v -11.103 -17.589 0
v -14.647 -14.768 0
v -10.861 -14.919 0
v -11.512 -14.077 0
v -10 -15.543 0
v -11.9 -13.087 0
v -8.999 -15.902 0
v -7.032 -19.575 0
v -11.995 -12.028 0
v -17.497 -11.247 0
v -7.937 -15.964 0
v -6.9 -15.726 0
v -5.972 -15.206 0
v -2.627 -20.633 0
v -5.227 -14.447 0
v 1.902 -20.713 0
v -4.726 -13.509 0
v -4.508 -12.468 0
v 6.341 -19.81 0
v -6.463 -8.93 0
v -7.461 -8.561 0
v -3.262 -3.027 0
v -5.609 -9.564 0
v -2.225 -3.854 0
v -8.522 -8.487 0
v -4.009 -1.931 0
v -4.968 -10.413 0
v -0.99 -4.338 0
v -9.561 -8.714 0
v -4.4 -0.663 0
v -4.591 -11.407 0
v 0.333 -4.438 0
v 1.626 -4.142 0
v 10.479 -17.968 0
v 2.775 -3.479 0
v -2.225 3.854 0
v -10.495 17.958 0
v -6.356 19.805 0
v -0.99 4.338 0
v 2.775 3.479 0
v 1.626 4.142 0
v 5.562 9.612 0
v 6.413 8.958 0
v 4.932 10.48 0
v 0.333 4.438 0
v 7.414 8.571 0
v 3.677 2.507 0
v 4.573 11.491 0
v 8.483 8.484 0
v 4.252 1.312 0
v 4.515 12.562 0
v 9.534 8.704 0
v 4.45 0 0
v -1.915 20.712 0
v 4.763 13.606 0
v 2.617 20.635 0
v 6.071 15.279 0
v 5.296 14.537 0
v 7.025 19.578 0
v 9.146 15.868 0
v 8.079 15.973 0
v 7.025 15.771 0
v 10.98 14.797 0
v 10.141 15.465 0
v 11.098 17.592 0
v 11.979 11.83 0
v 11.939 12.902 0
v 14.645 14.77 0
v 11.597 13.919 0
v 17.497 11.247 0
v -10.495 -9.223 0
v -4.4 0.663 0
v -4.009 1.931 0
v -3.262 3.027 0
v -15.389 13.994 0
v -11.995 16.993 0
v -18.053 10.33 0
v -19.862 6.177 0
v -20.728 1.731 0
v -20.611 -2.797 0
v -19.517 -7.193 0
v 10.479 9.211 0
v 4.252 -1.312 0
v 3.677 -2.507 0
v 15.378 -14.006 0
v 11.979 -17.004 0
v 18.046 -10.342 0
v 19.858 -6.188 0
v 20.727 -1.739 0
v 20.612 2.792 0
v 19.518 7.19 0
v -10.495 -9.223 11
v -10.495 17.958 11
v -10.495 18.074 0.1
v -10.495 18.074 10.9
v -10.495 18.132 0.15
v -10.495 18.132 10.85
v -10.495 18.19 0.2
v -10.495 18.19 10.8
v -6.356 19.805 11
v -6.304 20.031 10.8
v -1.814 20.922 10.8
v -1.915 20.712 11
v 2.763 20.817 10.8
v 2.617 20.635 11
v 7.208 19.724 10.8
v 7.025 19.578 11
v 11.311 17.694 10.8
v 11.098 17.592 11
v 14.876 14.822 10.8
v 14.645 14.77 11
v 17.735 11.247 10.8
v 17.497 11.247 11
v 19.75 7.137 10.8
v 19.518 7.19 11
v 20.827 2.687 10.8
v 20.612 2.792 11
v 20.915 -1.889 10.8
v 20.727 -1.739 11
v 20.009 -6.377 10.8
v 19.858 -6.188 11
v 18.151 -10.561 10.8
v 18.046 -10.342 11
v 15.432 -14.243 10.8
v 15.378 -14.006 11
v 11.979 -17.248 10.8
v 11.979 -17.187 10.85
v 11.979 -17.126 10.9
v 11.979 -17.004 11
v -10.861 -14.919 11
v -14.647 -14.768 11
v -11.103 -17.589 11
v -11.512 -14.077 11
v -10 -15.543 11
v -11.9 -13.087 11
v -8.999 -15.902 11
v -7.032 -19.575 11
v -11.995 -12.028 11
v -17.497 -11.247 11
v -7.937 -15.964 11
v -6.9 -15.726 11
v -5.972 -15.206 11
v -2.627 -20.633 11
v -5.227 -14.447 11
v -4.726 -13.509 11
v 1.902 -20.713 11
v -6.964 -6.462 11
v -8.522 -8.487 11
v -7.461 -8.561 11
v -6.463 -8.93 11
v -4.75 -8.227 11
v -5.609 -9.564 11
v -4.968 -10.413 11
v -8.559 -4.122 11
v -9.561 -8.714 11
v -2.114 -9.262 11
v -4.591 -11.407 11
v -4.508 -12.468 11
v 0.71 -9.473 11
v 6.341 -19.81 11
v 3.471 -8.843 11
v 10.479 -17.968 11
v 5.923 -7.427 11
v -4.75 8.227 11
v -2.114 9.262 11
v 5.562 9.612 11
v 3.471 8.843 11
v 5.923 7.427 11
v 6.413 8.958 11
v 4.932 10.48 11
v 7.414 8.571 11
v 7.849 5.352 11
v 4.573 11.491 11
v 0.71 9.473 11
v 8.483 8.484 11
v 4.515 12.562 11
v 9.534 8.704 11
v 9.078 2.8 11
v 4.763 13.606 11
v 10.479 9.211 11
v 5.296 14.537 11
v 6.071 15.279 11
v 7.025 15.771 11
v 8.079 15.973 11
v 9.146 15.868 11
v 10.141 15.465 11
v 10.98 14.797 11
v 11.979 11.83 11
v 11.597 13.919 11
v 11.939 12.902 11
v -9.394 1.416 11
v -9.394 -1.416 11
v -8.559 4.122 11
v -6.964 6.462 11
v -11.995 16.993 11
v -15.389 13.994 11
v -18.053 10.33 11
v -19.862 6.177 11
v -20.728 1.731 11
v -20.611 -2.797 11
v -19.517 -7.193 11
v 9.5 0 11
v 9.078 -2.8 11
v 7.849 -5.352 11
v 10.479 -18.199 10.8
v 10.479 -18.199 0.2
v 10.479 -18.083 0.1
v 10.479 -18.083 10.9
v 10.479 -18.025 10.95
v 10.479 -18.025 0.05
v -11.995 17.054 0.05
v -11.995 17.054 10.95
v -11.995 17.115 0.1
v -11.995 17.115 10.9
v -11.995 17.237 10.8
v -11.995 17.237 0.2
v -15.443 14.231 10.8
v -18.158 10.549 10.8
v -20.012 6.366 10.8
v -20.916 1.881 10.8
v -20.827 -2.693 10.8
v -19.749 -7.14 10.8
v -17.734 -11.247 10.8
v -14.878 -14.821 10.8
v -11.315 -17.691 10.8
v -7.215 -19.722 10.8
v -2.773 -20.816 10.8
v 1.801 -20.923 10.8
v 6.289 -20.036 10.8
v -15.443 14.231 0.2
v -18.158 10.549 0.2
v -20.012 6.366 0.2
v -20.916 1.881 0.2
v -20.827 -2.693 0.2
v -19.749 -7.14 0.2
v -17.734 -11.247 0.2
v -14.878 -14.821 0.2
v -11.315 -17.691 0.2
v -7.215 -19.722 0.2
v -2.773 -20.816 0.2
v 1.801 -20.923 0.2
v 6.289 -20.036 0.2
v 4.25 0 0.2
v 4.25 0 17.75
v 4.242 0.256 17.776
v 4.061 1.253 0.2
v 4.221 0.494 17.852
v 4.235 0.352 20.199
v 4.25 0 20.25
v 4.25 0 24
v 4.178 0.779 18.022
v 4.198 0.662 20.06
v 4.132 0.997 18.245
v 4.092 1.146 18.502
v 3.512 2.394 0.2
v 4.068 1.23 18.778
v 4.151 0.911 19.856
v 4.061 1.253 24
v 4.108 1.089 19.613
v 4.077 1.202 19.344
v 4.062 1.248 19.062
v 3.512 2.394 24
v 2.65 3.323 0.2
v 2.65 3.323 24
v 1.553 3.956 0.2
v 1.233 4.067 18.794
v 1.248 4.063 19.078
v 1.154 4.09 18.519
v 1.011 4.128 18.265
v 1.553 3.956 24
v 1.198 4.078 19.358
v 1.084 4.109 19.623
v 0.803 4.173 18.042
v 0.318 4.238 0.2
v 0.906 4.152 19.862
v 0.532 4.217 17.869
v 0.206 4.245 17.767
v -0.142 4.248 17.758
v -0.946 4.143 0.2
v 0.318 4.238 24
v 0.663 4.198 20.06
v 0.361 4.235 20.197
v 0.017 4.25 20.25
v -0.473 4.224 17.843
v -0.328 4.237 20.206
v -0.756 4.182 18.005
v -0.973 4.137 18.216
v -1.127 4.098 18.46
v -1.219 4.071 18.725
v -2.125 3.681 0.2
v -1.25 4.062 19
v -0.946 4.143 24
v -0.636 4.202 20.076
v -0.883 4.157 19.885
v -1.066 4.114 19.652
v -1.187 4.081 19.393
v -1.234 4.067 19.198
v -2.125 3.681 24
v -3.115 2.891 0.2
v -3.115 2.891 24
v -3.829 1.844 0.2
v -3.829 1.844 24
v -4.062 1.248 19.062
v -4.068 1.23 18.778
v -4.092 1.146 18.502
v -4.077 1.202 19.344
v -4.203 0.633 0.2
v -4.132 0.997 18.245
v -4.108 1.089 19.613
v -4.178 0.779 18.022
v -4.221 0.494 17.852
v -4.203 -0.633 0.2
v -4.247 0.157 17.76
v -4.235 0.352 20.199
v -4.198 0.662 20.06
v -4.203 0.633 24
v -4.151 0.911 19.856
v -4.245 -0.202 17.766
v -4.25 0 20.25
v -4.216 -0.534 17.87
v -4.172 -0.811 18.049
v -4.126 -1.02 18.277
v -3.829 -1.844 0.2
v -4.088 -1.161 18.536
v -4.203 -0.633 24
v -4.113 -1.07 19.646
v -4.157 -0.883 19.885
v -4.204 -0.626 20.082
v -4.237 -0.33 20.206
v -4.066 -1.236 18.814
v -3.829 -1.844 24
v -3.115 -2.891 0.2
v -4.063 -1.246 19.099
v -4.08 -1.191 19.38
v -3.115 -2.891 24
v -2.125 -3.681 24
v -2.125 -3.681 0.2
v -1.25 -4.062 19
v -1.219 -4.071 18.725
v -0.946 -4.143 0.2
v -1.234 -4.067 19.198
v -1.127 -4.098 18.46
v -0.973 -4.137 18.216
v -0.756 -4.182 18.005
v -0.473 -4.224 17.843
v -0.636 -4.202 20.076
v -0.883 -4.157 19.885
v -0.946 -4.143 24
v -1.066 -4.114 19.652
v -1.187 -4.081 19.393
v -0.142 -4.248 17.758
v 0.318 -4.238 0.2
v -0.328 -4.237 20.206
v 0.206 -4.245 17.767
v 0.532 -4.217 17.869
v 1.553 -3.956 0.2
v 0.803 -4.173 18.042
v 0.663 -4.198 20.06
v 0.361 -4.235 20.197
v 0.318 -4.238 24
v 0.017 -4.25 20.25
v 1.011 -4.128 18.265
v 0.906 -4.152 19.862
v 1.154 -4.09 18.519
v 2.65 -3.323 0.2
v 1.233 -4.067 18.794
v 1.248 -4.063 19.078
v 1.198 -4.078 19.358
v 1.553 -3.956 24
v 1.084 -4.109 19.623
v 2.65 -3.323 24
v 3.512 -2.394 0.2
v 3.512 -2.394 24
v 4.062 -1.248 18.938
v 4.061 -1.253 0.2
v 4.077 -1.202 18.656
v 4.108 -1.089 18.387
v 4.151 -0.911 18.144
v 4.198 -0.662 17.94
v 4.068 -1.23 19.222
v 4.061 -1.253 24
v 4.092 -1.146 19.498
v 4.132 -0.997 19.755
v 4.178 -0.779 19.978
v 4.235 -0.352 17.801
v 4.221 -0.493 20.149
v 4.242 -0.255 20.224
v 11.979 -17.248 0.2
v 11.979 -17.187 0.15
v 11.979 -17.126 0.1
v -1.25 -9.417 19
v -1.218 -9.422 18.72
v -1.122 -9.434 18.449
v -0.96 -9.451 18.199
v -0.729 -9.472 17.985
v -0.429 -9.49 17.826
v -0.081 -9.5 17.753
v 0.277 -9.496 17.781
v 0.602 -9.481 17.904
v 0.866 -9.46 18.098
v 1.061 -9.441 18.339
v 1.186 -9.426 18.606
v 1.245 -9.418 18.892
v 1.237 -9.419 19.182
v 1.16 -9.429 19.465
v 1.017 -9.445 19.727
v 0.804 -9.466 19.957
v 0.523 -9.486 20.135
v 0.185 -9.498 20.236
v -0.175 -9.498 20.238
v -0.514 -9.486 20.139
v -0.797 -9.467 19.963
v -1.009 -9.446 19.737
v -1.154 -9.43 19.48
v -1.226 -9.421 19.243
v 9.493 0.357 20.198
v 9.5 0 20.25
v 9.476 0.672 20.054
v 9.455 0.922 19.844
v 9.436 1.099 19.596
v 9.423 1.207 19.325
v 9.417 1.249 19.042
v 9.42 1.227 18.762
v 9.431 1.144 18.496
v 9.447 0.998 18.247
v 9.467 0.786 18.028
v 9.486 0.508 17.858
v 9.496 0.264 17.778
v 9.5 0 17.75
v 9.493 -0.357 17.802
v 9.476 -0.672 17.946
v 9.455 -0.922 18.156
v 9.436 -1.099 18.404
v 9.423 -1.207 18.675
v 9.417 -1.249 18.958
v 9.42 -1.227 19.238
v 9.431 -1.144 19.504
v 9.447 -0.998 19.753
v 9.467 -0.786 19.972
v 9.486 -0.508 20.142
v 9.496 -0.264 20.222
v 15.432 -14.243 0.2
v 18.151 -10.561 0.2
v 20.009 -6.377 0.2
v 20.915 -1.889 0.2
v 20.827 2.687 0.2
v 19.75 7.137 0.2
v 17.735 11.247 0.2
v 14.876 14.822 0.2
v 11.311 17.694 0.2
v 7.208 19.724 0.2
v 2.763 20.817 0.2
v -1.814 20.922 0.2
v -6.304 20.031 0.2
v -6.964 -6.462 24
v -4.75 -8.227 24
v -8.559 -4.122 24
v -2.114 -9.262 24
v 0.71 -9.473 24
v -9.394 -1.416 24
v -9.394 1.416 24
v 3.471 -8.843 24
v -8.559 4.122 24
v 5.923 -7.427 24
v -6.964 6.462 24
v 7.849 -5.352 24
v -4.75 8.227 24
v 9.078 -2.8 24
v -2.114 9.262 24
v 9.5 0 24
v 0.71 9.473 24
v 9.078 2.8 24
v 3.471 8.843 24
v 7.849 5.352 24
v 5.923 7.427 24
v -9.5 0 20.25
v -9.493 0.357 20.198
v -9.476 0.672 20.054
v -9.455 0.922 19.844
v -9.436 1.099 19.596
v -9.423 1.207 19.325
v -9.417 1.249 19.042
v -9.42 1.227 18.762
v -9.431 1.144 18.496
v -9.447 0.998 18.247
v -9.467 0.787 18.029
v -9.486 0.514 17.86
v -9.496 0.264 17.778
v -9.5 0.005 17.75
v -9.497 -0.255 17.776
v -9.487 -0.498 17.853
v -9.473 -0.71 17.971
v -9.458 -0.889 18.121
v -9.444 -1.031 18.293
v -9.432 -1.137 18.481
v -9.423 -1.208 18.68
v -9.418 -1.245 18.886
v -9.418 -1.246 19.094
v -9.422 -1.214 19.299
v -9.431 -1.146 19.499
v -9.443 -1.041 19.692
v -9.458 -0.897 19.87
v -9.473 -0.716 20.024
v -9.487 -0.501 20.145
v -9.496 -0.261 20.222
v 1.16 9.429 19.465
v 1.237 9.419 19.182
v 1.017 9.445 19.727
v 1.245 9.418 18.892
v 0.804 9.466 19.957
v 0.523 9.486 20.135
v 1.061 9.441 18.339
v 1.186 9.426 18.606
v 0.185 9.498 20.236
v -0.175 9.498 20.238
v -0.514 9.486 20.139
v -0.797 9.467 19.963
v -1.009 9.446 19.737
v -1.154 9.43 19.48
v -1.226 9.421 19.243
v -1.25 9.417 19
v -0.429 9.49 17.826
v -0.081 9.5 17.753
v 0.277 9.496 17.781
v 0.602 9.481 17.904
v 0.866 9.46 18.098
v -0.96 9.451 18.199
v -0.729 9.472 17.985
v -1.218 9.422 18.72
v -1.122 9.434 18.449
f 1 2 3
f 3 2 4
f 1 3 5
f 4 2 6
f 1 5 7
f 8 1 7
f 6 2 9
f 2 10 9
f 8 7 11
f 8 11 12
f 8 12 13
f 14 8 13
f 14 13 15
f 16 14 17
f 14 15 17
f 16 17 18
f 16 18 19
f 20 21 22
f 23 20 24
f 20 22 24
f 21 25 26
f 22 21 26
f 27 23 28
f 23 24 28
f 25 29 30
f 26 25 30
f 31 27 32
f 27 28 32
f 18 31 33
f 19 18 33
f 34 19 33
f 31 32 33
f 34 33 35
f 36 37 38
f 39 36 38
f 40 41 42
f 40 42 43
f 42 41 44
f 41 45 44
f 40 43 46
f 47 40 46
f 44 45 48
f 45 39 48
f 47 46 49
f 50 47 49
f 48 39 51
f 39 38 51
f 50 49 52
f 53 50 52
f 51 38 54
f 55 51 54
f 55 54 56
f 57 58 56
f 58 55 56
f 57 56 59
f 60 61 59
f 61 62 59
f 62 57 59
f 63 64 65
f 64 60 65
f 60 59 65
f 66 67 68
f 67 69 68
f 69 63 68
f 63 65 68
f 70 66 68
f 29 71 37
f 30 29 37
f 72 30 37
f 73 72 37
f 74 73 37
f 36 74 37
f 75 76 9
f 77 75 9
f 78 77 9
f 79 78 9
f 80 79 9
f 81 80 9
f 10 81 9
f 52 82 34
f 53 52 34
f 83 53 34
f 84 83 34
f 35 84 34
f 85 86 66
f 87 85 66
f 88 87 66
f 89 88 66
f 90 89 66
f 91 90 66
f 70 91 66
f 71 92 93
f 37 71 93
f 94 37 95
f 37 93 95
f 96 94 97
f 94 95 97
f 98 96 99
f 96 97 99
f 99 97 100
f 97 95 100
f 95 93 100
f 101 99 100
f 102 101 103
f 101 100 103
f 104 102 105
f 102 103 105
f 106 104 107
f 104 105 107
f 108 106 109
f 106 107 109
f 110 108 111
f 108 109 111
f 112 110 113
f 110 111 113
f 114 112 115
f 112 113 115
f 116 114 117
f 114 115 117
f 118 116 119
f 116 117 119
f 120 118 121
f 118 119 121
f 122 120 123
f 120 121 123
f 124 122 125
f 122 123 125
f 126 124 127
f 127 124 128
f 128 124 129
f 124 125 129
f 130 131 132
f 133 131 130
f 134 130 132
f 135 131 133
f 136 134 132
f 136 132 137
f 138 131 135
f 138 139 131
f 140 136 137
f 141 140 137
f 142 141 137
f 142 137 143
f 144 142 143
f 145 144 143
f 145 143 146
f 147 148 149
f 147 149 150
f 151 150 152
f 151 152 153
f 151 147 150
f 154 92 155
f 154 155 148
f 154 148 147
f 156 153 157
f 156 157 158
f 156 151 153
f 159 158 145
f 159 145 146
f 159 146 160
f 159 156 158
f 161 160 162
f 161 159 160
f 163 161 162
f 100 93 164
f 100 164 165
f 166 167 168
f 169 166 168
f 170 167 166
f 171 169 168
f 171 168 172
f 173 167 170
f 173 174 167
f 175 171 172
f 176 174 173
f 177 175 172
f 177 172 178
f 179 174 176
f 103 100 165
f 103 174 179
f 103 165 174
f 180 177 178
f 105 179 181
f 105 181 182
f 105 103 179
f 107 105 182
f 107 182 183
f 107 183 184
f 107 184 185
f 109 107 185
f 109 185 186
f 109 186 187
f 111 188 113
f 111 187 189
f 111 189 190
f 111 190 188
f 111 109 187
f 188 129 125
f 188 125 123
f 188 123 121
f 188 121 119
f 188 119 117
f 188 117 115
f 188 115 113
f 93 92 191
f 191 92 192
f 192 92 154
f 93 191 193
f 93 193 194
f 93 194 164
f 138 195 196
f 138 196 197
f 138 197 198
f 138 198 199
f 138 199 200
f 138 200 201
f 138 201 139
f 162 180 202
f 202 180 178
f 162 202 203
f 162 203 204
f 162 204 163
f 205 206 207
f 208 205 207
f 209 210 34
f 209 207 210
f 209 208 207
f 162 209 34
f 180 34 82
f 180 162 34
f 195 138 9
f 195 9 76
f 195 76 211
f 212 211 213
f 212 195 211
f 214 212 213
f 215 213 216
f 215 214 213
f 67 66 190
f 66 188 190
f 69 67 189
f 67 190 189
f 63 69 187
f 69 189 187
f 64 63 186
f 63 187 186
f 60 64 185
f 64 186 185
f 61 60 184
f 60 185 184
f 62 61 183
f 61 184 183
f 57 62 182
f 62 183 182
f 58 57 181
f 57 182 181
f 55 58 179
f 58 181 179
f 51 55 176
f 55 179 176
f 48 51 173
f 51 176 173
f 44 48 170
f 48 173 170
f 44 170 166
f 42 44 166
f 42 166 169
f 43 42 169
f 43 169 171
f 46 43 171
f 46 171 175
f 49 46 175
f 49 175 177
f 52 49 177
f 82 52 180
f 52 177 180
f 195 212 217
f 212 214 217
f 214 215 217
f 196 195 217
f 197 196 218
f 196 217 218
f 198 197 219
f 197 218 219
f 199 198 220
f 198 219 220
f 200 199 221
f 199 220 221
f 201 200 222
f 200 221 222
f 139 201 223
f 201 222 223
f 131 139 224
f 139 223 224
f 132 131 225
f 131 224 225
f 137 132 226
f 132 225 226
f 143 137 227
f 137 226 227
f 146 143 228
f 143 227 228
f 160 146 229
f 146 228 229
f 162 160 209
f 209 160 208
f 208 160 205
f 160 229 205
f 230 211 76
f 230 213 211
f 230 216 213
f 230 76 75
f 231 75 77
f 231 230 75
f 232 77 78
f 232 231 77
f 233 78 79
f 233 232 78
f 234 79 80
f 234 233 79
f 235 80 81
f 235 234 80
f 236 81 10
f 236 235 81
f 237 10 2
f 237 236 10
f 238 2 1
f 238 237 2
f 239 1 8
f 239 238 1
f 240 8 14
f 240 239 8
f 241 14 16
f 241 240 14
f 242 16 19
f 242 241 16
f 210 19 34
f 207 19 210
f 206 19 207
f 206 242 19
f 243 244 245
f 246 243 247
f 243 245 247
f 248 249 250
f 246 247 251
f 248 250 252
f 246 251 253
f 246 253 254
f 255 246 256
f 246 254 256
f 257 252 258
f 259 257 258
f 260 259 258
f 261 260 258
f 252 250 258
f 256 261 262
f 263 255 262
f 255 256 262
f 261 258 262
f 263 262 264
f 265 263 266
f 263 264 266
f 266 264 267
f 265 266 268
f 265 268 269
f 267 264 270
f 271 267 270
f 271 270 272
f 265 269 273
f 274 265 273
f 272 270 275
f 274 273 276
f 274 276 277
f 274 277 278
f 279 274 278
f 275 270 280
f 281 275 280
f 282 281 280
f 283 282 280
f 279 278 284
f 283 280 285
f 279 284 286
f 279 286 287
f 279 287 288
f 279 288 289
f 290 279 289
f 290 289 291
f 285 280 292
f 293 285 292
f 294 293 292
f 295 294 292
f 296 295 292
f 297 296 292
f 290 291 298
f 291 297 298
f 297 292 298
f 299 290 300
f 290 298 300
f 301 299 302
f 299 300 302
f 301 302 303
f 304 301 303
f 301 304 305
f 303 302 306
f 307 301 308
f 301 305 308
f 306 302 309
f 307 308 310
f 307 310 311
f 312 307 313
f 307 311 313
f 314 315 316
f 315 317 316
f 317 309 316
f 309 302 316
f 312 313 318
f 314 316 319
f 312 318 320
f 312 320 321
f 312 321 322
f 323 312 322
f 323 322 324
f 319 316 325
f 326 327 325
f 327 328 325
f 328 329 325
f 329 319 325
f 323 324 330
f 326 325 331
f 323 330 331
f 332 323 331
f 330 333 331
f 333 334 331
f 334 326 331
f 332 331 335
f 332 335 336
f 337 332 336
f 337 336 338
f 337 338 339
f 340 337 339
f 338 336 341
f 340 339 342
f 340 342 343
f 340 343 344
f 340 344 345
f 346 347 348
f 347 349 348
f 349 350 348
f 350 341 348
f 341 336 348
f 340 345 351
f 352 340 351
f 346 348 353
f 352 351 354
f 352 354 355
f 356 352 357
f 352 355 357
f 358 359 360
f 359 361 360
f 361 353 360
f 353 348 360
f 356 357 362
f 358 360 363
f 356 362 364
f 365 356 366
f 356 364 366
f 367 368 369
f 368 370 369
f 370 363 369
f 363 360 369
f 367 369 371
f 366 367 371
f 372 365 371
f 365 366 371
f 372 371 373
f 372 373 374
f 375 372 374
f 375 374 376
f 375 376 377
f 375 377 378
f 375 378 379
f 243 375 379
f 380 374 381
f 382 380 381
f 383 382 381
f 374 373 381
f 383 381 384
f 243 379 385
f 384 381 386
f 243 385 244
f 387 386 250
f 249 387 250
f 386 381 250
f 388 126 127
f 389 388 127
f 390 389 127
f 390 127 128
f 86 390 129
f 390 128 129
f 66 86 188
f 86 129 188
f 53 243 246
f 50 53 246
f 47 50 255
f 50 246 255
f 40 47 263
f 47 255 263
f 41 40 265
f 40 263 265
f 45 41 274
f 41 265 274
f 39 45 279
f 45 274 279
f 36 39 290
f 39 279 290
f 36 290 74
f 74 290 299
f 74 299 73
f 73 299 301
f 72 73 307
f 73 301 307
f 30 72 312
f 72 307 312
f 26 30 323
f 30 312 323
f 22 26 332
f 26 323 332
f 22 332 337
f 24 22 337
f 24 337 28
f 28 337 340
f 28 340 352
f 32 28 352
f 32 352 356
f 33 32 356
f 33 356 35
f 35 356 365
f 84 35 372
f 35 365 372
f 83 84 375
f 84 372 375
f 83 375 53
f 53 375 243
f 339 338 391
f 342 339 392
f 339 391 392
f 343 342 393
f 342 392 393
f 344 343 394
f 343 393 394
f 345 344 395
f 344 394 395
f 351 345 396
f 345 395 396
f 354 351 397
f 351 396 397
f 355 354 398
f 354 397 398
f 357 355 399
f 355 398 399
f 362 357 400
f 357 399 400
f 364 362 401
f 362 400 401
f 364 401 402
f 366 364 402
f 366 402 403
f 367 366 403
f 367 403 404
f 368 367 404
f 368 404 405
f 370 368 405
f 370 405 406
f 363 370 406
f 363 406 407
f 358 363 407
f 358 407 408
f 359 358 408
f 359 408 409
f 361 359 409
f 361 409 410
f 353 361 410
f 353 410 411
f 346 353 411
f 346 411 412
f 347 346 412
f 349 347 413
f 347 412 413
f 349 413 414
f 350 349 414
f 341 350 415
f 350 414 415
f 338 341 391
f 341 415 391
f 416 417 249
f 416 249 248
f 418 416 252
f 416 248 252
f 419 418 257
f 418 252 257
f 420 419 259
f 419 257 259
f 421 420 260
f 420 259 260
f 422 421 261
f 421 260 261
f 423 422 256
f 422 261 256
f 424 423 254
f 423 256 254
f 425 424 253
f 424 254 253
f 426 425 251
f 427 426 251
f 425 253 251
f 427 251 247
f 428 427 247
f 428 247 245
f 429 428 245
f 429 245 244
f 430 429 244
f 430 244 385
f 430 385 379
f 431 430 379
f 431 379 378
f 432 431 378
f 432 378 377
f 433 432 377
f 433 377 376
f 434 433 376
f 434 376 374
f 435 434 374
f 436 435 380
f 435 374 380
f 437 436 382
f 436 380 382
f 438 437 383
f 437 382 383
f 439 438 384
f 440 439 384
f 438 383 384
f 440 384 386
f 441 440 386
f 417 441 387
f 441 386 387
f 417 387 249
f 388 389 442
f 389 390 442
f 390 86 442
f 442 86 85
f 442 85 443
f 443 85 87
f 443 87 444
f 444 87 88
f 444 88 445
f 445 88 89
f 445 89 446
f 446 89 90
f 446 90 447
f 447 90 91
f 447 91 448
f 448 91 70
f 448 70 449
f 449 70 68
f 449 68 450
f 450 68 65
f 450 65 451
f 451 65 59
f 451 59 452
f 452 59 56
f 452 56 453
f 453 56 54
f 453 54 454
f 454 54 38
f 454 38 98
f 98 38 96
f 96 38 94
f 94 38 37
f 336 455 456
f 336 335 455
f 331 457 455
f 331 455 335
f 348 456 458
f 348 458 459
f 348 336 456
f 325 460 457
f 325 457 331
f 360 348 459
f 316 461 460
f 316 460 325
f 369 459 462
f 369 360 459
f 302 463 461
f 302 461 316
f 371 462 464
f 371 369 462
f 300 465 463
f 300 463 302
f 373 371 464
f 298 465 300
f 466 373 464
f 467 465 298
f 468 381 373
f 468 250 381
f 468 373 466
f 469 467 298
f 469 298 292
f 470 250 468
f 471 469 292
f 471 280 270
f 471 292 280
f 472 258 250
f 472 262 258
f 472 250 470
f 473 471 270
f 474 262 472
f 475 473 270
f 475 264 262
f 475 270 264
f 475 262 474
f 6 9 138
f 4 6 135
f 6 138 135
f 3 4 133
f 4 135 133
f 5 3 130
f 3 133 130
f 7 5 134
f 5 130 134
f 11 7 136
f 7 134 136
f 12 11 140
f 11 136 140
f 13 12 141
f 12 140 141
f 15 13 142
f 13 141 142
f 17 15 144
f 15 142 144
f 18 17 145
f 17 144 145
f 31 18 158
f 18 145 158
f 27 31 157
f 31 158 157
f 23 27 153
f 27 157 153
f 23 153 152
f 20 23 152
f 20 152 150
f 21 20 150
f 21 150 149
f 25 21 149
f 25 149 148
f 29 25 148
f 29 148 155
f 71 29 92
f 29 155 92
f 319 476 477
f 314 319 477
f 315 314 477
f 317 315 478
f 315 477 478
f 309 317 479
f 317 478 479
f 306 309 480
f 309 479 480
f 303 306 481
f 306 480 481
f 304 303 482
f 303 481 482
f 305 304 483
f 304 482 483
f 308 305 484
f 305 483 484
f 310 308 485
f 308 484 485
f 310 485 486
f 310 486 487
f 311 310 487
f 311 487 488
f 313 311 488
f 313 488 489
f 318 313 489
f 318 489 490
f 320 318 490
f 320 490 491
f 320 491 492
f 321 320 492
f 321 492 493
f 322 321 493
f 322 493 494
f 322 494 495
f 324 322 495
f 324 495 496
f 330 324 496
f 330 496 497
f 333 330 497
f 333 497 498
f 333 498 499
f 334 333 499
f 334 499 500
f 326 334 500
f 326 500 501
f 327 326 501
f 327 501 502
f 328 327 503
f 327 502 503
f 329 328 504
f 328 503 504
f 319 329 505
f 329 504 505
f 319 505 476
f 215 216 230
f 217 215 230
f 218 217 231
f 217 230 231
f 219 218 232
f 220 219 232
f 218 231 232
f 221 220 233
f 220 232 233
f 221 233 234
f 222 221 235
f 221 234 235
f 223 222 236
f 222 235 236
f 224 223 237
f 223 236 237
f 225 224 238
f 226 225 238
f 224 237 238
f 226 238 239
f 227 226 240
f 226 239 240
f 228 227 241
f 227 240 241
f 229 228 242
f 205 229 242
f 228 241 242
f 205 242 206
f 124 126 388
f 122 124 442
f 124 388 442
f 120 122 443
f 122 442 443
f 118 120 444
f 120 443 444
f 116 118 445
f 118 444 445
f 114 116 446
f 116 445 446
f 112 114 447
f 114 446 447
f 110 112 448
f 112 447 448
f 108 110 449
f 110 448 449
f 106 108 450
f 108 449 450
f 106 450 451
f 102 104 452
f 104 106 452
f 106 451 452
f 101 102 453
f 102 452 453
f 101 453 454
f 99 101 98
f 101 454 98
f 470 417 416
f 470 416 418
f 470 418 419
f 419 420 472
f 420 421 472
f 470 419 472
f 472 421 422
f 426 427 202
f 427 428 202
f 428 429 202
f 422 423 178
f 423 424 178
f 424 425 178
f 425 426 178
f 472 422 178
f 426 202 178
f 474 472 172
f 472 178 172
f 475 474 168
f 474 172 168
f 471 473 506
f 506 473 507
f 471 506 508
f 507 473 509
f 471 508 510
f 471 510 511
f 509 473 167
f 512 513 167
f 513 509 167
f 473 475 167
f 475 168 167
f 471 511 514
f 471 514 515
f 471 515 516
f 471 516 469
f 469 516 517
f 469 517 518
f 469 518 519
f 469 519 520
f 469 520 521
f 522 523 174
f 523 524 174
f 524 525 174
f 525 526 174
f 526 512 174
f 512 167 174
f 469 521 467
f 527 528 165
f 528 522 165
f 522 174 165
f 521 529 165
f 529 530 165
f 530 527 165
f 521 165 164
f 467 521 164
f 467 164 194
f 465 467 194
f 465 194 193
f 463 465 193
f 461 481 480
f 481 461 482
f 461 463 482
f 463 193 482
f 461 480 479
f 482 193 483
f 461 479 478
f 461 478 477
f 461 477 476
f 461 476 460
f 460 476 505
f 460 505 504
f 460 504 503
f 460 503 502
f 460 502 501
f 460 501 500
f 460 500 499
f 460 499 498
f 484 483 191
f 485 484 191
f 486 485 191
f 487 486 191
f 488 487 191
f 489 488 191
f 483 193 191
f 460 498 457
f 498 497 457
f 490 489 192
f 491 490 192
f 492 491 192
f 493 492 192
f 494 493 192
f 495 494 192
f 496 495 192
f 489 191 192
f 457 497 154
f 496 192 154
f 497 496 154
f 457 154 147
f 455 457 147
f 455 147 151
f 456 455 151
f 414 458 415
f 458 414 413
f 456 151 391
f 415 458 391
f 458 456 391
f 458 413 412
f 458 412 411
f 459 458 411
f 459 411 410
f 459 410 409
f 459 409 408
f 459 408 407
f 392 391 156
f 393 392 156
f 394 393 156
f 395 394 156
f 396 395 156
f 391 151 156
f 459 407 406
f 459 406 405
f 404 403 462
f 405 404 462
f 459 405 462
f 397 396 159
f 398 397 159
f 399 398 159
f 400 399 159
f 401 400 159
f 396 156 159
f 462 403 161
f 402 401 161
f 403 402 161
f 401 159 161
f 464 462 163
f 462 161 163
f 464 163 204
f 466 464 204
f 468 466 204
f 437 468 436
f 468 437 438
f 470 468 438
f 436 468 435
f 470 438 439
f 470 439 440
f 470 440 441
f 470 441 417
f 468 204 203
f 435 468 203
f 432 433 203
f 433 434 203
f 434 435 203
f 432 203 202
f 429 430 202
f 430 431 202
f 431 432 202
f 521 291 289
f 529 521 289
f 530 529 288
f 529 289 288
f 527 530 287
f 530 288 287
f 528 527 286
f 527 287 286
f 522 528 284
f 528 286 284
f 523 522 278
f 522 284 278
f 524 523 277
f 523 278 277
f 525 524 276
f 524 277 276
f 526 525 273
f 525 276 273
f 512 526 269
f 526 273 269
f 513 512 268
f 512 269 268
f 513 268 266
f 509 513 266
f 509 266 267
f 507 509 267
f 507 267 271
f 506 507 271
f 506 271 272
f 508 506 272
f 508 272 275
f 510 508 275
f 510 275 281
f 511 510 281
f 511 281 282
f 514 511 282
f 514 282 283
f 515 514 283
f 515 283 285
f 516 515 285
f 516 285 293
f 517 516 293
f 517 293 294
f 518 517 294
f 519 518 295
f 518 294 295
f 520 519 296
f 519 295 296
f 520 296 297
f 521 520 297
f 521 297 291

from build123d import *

# Parameters (mm, degrees)
ESQUISSE1_R                               = 21
BOSS_EXTRU_1_DEPTH                        = 11
ESQUISSE2_R                               = 9.5
BOSS_EXTRU_2_DEPTH                        = 13
ESQUISSE3_R                               = 4.25
ENL_V_MAT_EXTRU_1_DEPTH                   = 25
ESQUISSE4_R                               = 3.75
ENL_V_MAT_EXTRU_2_DEPTH                   = 12
ESQUISSE5_W                               = 1.5
ESQUISSE5_H                               = 31.997947006
ESQUISSE5_H_2                             = 31.644558259
ENL_V_MAT_EXTRU_3_DEPTH                   = 12
TROU_POUR_TARAUDAGE_POUR_TROU_TARAUD_M3_D = 2.5
TROU_POUR_TARAUDAGE_POUR_TROU_TARAUD_2_D  = 2.5
CHANFREIN1_SIZE                           = 0.2


with BuildPart() as part:
    # Esquisse1 → Boss.-Extru.1 (new body)
    with BuildSketch(Plane.XY):
        Circle(ESQUISSE1_R)
    extrude(amount=BOSS_EXTRU_1_DEPTH)

    # Esquisse2 → Boss.-Extru.2 (add)
    with BuildSketch(Plane.XY.offset(11)):
        Circle(ESQUISSE2_R)
    extrude(amount=BOSS_EXTRU_2_DEPTH)

    # Esquisse3 → Enlèv. mat.-Extru.1 (cut, through all)
    with BuildSketch(Plane.XY.offset(24)):
        Circle(ESQUISSE3_R)
    extrude(amount=-ENL_V_MAT_EXTRU_1_DEPTH, mode=Mode.SUBTRACT)

    # Esquisse4 → Enlèv. mat.-Extru.2 (cut, through all)
    with BuildSketch(Plane.XY.offset(11)):
        with Locations((8.25, 12.227019261)):
            Circle(ESQUISSE4_R)
        with Locations((-8.25, -12.227019261)):
            Circle(ESQUISSE4_R)
    extrude(amount=-ENL_V_MAT_EXTRU_2_DEPTH, mode=Mode.SUBTRACT)

    # Esquisse5 → Enlèv. mat.-Extru.3 (cut, through all)
    with BuildSketch(Plane.XY.offset(11)):
        with Locations((-11.244697488, 3.971304994)):
            Rectangle(ESQUISSE5_W, ESQUISSE5_H)
        with Locations((11.228919753, -3.198198825)):
            Rectangle(ESQUISSE5_W, ESQUISSE5_H_2)
    extrude(amount=-ENL_V_MAT_EXTRU_3_DEPTH, mode=Mode.SUBTRACT)

    # Trou pour taraudage pour trou taraud_ M3 (through all)
    with Locations(Plane(origin=(0, 10, 0), x_dir=(1, 0, 0), z_dir=(0, 1, 0))):
        with Locations((0, -19)):
            Hole(TROU_POUR_TARAUDAGE_POUR_TROU_TARAUD_M3_D / 2)

    # Trou pour taraudage pour trou taraud 2 (through all)
    with Locations(Plane(origin=(10, 0, 0), x_dir=(0, 0, -1), z_dir=(1, 0, 0))):
        with Locations((-19, 0)):
            Hole(TROU_POUR_TARAUDAGE_POUR_TROU_TARAUD_2_D / 2)

    # Chanfrein1
    chanfrein1_edges = [part.edges().sort_by_distance(p)[0] for p in [
        (-4.25, 0, 0),
        (-17.734235345, -11.24708392, 0),
        (-17.734235345, -11.24708392, 11),
        (17.734504383, 11.246659695, 0),
        (17.734504383, 11.246659695, 11),
    ]]
    chamfer(chanfrein1_edges, length=CHANFREIN1_SIZE)


solid = part.part
